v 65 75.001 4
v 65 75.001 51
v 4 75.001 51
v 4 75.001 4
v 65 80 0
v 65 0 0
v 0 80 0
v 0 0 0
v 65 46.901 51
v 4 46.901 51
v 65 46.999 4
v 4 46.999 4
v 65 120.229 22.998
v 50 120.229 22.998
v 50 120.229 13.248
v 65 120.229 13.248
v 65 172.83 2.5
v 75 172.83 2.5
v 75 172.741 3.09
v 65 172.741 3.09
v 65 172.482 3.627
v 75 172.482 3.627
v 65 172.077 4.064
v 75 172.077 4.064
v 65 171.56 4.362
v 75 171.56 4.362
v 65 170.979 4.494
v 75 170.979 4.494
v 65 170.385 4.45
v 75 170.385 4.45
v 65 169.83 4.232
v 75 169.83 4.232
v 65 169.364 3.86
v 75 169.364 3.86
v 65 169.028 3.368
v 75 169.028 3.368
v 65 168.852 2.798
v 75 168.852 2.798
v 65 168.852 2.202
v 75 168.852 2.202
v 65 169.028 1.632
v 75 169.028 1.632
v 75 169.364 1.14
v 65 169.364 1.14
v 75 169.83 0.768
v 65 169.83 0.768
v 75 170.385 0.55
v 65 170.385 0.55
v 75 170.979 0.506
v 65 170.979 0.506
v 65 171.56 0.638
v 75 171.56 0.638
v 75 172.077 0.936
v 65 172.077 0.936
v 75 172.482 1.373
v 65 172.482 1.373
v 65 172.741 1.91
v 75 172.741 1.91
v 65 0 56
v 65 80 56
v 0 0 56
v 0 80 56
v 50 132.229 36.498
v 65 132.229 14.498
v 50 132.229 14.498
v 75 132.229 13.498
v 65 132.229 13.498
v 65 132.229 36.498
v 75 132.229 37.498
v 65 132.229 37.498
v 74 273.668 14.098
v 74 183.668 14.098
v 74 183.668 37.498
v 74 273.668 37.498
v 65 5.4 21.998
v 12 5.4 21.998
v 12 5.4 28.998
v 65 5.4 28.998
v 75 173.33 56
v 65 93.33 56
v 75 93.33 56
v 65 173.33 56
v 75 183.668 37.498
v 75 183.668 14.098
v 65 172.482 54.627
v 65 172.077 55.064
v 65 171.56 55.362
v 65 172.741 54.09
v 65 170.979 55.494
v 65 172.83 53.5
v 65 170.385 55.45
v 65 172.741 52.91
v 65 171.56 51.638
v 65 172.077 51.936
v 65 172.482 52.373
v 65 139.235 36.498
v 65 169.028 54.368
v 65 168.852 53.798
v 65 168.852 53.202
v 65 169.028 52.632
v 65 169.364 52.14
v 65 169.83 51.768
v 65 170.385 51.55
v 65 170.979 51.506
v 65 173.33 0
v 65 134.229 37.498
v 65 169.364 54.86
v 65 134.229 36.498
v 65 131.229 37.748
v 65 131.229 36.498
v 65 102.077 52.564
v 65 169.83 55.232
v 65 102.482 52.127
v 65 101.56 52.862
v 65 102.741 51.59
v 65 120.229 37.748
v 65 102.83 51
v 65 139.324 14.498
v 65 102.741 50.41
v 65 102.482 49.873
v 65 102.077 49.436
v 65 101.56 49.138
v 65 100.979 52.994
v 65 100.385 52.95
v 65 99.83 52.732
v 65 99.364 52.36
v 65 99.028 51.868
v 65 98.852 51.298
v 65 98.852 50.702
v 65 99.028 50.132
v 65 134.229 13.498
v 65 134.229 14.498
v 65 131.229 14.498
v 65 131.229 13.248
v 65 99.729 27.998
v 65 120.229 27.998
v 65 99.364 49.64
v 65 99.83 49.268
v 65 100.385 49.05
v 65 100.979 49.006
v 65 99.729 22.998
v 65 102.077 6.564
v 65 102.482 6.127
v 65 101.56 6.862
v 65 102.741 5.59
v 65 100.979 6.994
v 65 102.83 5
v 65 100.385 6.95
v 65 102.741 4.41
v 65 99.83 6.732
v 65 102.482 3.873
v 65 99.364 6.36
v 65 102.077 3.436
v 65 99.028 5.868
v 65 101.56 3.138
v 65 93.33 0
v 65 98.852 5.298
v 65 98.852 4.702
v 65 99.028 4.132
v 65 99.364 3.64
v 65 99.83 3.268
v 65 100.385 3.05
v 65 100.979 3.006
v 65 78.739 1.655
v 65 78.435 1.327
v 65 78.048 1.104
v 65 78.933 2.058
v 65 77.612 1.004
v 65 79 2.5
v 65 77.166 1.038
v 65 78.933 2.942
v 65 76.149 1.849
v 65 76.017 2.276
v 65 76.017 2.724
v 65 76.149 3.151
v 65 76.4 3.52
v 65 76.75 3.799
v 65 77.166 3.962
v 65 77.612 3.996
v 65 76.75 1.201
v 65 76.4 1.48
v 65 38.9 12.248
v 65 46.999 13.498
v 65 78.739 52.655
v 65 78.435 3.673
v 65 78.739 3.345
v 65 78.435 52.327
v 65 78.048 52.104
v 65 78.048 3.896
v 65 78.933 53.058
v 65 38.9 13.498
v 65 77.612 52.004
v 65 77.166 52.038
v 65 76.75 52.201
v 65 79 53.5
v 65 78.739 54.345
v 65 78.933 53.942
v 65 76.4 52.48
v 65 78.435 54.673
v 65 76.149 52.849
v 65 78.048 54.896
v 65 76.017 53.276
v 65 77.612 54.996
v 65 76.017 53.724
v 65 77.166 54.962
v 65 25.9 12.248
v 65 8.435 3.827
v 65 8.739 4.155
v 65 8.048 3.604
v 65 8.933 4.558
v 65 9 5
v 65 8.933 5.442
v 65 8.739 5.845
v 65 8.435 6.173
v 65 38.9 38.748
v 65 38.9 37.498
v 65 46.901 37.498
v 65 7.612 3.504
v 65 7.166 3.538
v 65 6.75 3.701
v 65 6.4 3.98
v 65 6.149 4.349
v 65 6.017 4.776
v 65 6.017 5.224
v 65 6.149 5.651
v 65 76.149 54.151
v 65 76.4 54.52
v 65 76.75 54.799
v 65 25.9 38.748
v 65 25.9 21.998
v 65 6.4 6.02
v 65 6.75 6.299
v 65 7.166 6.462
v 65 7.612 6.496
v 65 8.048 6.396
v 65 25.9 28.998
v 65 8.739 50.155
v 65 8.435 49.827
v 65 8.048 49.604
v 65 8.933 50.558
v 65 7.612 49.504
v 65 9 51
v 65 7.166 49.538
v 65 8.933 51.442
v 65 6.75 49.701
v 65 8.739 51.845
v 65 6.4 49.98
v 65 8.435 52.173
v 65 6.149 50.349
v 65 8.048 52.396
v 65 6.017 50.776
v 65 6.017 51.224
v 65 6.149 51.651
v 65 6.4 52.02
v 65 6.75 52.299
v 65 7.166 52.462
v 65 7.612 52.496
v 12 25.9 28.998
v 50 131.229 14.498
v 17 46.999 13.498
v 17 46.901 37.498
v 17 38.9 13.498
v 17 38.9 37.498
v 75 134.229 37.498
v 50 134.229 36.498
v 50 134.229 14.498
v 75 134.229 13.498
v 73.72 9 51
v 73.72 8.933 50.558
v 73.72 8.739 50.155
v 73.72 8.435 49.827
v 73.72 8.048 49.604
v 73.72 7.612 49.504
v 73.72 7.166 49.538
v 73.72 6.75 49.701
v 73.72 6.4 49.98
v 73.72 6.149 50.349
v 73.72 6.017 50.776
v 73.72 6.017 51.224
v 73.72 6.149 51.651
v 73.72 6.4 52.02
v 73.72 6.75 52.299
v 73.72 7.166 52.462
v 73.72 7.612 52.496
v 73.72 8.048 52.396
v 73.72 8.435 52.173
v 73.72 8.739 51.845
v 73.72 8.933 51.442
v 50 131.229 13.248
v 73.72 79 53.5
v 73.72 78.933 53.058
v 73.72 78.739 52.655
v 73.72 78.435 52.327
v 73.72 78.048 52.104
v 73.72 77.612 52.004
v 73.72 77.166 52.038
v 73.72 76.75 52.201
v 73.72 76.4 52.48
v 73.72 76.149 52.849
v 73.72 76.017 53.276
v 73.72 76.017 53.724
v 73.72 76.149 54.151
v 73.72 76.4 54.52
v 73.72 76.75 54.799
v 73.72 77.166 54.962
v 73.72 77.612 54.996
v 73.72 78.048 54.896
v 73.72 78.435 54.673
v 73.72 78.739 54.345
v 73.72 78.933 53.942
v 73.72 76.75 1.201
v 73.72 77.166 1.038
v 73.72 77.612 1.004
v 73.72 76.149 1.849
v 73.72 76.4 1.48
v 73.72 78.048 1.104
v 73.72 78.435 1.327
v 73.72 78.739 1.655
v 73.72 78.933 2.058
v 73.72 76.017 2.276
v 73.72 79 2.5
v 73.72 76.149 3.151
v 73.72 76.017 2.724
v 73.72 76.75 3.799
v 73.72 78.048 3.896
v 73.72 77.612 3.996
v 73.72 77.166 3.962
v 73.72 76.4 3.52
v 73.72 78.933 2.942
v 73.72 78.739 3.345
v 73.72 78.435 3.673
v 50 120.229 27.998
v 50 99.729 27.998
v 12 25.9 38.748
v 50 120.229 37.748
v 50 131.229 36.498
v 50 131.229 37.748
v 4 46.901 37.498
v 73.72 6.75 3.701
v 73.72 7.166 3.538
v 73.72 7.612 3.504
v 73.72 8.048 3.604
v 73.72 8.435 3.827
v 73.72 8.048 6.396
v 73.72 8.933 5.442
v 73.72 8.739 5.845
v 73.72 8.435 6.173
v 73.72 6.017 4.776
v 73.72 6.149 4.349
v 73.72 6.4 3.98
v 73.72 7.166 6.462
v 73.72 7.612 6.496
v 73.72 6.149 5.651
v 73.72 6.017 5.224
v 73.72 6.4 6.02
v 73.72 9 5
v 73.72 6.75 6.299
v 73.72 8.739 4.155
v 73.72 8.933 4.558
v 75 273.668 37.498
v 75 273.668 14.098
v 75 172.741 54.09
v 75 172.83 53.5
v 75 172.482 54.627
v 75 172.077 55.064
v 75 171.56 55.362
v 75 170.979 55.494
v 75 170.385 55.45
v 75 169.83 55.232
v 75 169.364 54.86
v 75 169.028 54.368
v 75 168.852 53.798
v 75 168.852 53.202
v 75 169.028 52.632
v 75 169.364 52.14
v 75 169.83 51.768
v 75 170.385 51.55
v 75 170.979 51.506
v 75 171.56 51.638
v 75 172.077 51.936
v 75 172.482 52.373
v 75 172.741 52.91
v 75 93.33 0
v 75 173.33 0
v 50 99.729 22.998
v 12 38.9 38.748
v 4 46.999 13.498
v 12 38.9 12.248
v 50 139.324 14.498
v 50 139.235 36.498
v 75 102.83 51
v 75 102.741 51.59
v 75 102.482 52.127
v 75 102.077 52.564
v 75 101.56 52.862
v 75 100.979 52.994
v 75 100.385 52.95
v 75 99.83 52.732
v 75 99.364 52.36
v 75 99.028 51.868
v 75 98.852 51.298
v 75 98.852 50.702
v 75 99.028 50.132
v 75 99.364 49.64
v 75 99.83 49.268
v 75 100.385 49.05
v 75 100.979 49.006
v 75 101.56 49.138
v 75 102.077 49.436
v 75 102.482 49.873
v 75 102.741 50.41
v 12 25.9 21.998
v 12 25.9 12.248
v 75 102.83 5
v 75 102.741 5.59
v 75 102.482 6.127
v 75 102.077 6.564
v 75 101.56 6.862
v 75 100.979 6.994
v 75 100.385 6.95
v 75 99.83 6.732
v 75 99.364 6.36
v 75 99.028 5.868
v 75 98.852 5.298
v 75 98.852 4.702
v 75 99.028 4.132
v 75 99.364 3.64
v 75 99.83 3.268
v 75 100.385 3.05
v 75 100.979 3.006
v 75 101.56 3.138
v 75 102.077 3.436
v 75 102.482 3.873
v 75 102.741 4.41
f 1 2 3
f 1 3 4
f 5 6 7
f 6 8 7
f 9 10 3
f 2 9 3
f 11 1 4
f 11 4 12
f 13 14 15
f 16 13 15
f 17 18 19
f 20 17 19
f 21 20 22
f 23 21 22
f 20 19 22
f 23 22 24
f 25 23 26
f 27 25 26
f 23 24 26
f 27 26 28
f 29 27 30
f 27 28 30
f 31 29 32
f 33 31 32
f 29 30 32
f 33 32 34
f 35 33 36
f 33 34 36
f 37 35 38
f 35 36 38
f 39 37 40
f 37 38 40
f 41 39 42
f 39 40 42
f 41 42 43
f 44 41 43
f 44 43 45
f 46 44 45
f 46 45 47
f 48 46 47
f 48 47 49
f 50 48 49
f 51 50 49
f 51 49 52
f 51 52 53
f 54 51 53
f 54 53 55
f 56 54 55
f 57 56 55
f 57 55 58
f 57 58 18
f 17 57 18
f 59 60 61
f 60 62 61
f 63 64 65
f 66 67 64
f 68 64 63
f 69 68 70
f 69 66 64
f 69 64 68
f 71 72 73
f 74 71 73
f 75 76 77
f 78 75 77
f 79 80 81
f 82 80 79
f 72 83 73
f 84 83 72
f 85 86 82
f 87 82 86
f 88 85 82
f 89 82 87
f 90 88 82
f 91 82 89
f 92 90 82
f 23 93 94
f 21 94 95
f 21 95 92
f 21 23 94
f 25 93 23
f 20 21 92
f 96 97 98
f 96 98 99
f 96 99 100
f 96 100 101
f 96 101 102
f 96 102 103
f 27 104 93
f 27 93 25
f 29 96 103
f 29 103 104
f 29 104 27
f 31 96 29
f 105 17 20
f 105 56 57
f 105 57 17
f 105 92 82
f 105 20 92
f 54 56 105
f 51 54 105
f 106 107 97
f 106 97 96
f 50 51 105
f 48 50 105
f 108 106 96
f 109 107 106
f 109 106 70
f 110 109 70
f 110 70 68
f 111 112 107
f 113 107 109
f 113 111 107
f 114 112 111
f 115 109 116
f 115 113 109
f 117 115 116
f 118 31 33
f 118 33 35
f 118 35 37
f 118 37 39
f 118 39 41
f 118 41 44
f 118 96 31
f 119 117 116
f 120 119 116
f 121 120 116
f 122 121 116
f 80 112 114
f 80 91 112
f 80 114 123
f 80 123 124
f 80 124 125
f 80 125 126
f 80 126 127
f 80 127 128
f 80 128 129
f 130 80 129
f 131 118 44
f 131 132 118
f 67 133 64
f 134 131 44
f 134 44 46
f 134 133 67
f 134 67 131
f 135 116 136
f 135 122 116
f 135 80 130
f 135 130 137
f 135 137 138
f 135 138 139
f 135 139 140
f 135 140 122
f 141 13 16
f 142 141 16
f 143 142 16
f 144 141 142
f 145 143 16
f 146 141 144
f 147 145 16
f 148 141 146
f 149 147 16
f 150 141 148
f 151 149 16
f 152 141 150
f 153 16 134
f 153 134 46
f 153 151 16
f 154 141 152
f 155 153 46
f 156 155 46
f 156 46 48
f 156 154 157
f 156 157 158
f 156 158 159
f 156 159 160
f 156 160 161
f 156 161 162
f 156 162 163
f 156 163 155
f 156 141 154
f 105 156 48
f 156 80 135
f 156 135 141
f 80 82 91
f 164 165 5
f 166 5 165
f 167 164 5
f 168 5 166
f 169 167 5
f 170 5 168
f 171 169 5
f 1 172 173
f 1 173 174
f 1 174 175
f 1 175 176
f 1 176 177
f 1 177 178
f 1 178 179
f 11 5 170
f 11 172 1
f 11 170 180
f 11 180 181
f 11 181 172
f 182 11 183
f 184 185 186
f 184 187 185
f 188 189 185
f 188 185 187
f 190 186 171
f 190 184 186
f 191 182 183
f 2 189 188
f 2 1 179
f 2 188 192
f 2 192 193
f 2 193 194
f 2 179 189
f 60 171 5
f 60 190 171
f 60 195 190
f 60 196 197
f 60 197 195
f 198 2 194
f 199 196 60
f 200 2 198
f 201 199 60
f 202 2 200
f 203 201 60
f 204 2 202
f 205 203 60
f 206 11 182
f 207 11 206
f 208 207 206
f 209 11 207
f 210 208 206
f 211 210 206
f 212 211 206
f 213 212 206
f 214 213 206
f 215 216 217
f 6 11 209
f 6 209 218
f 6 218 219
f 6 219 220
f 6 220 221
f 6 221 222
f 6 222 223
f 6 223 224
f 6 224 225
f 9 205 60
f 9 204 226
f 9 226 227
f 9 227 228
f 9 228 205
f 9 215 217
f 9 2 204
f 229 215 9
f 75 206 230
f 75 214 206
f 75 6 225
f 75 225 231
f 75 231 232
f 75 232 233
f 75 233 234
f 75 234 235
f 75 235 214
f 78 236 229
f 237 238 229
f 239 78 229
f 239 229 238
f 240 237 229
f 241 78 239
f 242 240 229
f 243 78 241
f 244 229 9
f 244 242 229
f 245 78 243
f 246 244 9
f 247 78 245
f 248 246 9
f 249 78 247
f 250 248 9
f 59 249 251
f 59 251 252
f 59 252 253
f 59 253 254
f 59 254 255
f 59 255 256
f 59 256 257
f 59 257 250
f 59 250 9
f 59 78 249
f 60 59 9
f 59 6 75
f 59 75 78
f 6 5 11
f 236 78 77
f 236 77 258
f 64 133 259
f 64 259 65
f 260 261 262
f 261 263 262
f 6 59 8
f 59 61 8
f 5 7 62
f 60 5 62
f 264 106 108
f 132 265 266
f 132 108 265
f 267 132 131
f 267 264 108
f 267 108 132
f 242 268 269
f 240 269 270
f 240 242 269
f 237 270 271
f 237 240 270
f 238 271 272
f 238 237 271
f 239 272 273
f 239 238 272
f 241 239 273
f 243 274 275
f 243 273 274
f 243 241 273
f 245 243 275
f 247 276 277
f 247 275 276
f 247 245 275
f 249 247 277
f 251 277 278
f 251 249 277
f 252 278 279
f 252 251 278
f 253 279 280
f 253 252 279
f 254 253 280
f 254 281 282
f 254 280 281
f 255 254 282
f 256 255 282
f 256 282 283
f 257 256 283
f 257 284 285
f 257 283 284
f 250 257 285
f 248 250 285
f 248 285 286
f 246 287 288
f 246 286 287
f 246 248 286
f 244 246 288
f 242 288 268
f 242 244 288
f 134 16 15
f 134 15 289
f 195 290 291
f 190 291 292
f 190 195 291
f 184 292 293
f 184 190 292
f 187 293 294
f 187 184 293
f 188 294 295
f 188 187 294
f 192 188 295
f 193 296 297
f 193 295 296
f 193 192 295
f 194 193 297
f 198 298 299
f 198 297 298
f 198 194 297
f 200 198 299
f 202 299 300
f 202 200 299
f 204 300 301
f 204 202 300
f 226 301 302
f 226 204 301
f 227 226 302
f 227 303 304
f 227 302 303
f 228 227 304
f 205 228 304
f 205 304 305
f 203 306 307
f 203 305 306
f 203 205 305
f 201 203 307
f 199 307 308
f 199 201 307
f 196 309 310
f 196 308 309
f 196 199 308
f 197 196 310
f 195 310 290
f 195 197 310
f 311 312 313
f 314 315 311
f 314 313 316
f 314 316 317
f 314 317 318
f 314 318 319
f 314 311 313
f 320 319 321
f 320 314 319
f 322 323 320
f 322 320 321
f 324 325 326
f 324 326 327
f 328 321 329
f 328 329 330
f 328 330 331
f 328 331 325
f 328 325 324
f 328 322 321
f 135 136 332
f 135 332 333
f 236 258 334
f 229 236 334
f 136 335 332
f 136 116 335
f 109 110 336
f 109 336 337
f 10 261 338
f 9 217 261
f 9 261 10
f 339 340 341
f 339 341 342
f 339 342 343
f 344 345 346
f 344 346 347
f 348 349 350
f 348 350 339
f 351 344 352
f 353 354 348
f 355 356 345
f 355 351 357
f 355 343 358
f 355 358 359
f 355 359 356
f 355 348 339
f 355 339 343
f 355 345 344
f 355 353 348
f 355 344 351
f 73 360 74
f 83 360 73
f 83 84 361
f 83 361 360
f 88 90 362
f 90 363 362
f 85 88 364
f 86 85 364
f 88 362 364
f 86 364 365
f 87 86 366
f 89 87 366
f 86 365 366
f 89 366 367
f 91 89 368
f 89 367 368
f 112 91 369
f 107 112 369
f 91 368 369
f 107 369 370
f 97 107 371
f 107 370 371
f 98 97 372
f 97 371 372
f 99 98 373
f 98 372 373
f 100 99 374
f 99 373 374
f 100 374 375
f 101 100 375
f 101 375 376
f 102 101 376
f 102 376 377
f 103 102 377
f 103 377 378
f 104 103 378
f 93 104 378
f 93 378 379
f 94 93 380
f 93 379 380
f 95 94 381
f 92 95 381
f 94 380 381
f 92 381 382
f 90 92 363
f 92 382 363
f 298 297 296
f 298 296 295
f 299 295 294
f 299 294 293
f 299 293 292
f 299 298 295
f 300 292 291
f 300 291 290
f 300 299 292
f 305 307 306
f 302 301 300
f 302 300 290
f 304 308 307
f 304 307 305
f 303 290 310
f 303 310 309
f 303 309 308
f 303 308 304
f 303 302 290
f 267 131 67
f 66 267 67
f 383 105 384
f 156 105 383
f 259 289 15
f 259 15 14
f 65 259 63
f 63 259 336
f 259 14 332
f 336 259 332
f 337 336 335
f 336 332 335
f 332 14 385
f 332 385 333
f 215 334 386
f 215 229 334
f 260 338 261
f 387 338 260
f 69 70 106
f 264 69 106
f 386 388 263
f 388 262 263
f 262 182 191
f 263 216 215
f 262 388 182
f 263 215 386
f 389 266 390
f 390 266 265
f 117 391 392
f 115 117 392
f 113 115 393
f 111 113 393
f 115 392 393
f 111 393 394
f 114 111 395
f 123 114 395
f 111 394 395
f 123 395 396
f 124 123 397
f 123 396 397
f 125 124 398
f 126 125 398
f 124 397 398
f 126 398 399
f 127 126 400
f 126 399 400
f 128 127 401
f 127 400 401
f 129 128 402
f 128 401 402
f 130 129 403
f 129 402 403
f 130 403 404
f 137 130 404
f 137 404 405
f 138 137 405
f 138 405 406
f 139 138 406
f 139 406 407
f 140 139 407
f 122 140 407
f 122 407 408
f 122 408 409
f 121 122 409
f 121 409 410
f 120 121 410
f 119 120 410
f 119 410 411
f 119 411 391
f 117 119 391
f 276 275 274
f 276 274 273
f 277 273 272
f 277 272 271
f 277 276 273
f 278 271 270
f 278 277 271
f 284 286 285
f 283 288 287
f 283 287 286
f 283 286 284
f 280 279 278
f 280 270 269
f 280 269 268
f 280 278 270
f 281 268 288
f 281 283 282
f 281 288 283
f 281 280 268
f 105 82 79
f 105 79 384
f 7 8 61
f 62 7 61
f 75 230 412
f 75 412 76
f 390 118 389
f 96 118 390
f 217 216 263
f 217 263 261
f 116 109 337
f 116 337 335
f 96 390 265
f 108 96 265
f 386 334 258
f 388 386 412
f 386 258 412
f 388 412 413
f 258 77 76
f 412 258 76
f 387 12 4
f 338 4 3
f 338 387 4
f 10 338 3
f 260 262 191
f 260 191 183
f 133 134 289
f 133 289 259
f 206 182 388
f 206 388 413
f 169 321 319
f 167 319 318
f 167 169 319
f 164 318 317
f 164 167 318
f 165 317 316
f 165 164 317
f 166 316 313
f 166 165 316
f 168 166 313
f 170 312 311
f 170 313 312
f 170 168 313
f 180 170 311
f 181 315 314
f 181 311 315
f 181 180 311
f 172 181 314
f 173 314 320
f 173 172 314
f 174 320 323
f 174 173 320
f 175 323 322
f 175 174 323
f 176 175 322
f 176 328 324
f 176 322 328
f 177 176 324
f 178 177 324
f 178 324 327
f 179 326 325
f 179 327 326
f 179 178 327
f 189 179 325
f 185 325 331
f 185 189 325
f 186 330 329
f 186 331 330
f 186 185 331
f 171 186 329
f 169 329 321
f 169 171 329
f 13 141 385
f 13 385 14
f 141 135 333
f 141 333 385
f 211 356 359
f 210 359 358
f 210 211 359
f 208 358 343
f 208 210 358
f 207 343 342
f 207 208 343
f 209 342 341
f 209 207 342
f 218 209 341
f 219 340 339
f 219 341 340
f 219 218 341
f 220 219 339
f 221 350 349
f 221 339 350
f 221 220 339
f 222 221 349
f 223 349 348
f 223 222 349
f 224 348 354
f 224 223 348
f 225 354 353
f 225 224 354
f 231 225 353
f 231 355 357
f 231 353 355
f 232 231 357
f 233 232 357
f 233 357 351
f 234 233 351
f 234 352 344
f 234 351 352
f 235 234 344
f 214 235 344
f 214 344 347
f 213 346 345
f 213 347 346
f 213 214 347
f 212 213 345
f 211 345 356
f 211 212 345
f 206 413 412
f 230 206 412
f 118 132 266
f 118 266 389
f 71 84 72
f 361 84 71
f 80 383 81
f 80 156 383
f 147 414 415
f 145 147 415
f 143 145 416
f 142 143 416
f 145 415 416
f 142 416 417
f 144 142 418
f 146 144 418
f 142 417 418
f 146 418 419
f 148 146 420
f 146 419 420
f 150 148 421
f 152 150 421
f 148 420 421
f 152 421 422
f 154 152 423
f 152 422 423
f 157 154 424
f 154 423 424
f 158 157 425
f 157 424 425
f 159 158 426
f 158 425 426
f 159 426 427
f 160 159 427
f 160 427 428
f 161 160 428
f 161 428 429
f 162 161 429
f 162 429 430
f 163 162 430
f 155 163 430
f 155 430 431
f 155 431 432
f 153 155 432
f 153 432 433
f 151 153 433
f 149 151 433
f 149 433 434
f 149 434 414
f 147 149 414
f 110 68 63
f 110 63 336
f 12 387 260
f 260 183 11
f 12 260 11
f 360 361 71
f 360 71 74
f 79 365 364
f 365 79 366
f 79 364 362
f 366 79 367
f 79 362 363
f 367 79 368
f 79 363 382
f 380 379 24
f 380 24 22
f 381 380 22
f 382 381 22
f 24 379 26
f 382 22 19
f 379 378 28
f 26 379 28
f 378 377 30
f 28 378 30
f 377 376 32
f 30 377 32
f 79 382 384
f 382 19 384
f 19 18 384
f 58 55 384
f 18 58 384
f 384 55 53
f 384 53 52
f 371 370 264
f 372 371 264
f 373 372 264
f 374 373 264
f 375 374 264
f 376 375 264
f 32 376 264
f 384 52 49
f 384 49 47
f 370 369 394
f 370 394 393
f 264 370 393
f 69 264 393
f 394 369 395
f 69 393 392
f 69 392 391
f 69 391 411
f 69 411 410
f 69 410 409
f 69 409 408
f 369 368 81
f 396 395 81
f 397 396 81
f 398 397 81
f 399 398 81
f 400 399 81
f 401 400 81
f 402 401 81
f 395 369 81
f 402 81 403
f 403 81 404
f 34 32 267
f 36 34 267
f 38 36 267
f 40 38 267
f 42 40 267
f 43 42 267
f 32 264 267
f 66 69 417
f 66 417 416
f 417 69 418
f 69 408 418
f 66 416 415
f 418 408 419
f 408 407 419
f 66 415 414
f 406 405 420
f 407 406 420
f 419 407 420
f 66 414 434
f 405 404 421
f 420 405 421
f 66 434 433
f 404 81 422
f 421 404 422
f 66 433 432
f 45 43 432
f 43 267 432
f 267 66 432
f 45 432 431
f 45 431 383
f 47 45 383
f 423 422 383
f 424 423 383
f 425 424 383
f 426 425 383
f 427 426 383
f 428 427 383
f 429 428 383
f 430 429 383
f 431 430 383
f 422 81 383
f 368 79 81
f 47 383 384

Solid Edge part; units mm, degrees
sketch "Sketch1" plane through (0, 0, 0) normal (1, 0, 0) x (0, 1, 0)
  line L0 (0, 0) -> (80, 0)
  line L1 (80, 0) -> (80, 56)
  line L2 (80, 56) -> (0, 56)
  line L3 (0, 56) -> (0, 0)
extrude "Protrusion1" add sketch "Sketch1" along normal blind 65
sketch "Sketch2" plane through (65, 40, 28) normal (1, 0, 0) x (0, 1, 0)
  line L0 (-1.1004, -15.7521) -> (-1.1004, -14.5021)
  line L1 (-1.1004, -14.5021) -> (6.9988, -14.5021)
  line L2 (6.9988, -14.5021) -> (6.9988, -24)
  line L3 (35.0012, -24) -> (6.9988, -24)
  line L4 (35.0012, 23) -> (35.0012, -24)
  line L5 (6.9008, 23) -> (35.0012, 23)
  line L6 (6.9008, 9.4979) -> (6.9008, 23)
  line L7 (-1.1004, 9.4979) -> (6.9008, 9.4979)
  line L8 (-1.1004, 10.7479) -> (-1.1004, 9.4979)
  line L9 (-14.1004, 10.7479) -> (-1.1004, 10.7479)
  line L10 (-14.1004, 0.9979) -> (-14.1004, 10.7479)
  line L11 (-34.6004, 0.9979) -> (-14.1004, 0.9979)
  line L12 (-34.6004, -6.0021) -> (-34.6004, 0.9979)
  line L13 (-14.1004, -6.0021) -> (-34.6004, -6.0021)
  line L14 (-14.1004, -15.7521) -> (-14.1004, -6.0021)
  line L15 (-1.1004, -15.7521) -> (-14.1004, -15.7521)
extrude "ExtrudedCutout_1" cut sketch "Sketch2" against normal blind 61
sketch "Sketch3" plane through (4, 40.2004, 27.5) normal (1, 0, 0) x (0, 1, 0)
  line L0 (-1.3008, 9.9979) -> (6.7004, 9.9979)
  line L1 (6.7004, 9.9979) -> (6.7984, -14.0021)
  line L2 (6.7984, -14.0021) -> (-1.3008, -14.0021)
  line L3 (-1.3008, -14.0021) -> (-1.3008, 9.9979)
extrude "ExtrudedProtrusion_2" add sketch "Sketch3" along normal blind 13
sketch "Sketch4" plane through (4, 22.1496, 25.4979) normal (1, 0, 0) x (0, 1, 0)
  line L0 (3.75, 3.5) -> (3.75, 13.25)
  line L1 (3.75, 13.25) -> (16.75, 13.25)
  line L2 (16.75, 13.25) -> (16.75, -13.25)
  line L3 (16.75, -13.25) -> (3.75, -13.25)
  line L4 (3.75, -13.25) -> (3.75, -3.5)
  line L5 (3.75, -3.5) -> (-16.75, -3.5)
  line L6 (-16.75, -3.5) -> (-16.75, 3.5)
  line L7 (-16.75, 3.5) -> (3.75, 3.5)
extrude "ExtrudedProtrusion_3" add sketch "Sketch4" along normal blind 8
extrude "Cutout1" [suppressed]
sketch "Sketch5" plane through (77, 40, 28) normal (1, 0, 0) x (0, 1, 0)
  circle A0 centre (-32.5, 23) radius 2
  circle A1 centre (-32.5, -23) radius 2
  circle A2 centre (37.5, -25.5) radius 2
  circle A3 centre (37.5, 25.5) radius 2
extrude "Cutout2" cut sketch "Sketch5" against normal blind 22.7505
sketch "Sketch6" plane through (54.2495, 7.5, 51) normal (1, 0, 0) x (0, 1, 0)
  circle A0 centre (0, 0) radius 1.5
  circle A1 centre (70, 2.5) radius 1.5
  circle A2 centre (70, -48.5) radius 1.5
  circle A3 centre (0, -46) radius 1.5
extrude "ExtrudedProtrusion_5" add sketch "Sketch6" along normal blind 19.4709
sketch "Sketch7" plane through (54.2495, 7.5, 51) normal (1, 0, 0) x (0, 1, 0)
  circle A0 centre (0, 0) radius 2.0647
  circle A1 centre (70, 2.5) radius 2
  circle A2 centre (70, -48.5) radius 2
  circle A3 centre (0, -46) radius 2
extrude "Protrusion2" add sketch "Sketch7" along normal up to vertex (10.7505 mm away)
sketch "Sketch8" plane through (65, 40, 28) normal (1, 0, 0) x (0, 1, 0)
  line L0 (133.3298, 28) -> (133.3298, -28)
  line L1 (133.3298, -28) -> (53.3298, -28)
  line L2 (53.3298, -28) -> (53.3298, 28)
  line L3 (53.3298, 28) -> (133.3298, 28)
extrude "ExtrudedProtrusion_7" add sketch "Sketch8" along normal blind 10
sketch "Sketch9" plane through (75, 133.3298, 28) normal (1, 0, 0) x (0, 1, 0)
  circle A0 centre (-32.5, 23) radius 2
  circle A1 centre (37.5, 25.5) radius 2
  circle A2 centre (37.5, -25.5) radius 2
  circle A3 centre (-32.5, -23) radius 2
extrude "ExtrudedCutout_4" cut sketch "Sketch9" against normal blind 64.7982
sketch "Sketch10" plane through (65, 133.3298, 28) normal (-1, 0, 0) x (0, 0, -1)
  line L0 (0.0021, 13.1004) -> (0.0021, 33.6004)
  line L1 (0.0021, 33.6004) -> (5.0021, 33.6004)
  line L2 (5.0021, 33.6004) -> (5.0021, 13.1004)
  line L3 (5.0021, 13.1004) -> (14.7521, 13.1004)
  line L4 (14.7521, 13.1004) -> (14.7521, 2.1004)
  line L5 (14.7521, 2.1004) -> (13.5021, 2.1004)
  line L6 (13.5021, 2.1004) -> (13.5021, -5.9947)
  line L7 (13.5021, -5.9947) -> (-8.4979, -5.9049)
  line L8 (-8.4979, -5.9049) -> (-8.4979, 2.1004)
  line L9 (-8.4979, 2.1004) -> (-9.7479, 2.1004)
  line L10 (-9.7479, 2.1004) -> (-9.7479, 13.1004)
  line L11 (-9.7479, 13.1004) -> (0.0021, 13.1004)
extrude "ExtrudedProtrusion_8" add sketch "Sketch10" along normal blind 15
sketch "Sketch11" plane through (75, 133.3298, 28) normal (1, 0, 0) x (0, 1, 0)
  line L0 (-1.1004, 9.4979) -> (0.8996, 9.4979)
  line L1 (0.8996, 9.4979) -> (0.8996, -14.5021)
  line L2 (0.8996, -14.5021) -> (-1.1004, -14.5021)
  line L3 (-1.1004, -14.5021) -> (-1.1004, 9.4979)
extrude "ExtrudedCutout_5" cut sketch "Sketch11" against normal blind 67.8026
sketch "Sketch12" plane through (75, 133.3298, 28) normal (1, 0, 0) x (0, 1, 0)
  line L0 (50.338, 9.4979) -> (50.338, -13.9021)
  line L1 (50.338, -13.9021) -> (140.338, -13.9021)
  line L2 (140.338, -13.9021) -> (140.338, 9.4979)
  line L3 (140.338, 9.4979) -> (50.338, 9.4979)
extrude "ExtrudedProtrusion_9" add sketch "Sketch12" against normal blind 1
